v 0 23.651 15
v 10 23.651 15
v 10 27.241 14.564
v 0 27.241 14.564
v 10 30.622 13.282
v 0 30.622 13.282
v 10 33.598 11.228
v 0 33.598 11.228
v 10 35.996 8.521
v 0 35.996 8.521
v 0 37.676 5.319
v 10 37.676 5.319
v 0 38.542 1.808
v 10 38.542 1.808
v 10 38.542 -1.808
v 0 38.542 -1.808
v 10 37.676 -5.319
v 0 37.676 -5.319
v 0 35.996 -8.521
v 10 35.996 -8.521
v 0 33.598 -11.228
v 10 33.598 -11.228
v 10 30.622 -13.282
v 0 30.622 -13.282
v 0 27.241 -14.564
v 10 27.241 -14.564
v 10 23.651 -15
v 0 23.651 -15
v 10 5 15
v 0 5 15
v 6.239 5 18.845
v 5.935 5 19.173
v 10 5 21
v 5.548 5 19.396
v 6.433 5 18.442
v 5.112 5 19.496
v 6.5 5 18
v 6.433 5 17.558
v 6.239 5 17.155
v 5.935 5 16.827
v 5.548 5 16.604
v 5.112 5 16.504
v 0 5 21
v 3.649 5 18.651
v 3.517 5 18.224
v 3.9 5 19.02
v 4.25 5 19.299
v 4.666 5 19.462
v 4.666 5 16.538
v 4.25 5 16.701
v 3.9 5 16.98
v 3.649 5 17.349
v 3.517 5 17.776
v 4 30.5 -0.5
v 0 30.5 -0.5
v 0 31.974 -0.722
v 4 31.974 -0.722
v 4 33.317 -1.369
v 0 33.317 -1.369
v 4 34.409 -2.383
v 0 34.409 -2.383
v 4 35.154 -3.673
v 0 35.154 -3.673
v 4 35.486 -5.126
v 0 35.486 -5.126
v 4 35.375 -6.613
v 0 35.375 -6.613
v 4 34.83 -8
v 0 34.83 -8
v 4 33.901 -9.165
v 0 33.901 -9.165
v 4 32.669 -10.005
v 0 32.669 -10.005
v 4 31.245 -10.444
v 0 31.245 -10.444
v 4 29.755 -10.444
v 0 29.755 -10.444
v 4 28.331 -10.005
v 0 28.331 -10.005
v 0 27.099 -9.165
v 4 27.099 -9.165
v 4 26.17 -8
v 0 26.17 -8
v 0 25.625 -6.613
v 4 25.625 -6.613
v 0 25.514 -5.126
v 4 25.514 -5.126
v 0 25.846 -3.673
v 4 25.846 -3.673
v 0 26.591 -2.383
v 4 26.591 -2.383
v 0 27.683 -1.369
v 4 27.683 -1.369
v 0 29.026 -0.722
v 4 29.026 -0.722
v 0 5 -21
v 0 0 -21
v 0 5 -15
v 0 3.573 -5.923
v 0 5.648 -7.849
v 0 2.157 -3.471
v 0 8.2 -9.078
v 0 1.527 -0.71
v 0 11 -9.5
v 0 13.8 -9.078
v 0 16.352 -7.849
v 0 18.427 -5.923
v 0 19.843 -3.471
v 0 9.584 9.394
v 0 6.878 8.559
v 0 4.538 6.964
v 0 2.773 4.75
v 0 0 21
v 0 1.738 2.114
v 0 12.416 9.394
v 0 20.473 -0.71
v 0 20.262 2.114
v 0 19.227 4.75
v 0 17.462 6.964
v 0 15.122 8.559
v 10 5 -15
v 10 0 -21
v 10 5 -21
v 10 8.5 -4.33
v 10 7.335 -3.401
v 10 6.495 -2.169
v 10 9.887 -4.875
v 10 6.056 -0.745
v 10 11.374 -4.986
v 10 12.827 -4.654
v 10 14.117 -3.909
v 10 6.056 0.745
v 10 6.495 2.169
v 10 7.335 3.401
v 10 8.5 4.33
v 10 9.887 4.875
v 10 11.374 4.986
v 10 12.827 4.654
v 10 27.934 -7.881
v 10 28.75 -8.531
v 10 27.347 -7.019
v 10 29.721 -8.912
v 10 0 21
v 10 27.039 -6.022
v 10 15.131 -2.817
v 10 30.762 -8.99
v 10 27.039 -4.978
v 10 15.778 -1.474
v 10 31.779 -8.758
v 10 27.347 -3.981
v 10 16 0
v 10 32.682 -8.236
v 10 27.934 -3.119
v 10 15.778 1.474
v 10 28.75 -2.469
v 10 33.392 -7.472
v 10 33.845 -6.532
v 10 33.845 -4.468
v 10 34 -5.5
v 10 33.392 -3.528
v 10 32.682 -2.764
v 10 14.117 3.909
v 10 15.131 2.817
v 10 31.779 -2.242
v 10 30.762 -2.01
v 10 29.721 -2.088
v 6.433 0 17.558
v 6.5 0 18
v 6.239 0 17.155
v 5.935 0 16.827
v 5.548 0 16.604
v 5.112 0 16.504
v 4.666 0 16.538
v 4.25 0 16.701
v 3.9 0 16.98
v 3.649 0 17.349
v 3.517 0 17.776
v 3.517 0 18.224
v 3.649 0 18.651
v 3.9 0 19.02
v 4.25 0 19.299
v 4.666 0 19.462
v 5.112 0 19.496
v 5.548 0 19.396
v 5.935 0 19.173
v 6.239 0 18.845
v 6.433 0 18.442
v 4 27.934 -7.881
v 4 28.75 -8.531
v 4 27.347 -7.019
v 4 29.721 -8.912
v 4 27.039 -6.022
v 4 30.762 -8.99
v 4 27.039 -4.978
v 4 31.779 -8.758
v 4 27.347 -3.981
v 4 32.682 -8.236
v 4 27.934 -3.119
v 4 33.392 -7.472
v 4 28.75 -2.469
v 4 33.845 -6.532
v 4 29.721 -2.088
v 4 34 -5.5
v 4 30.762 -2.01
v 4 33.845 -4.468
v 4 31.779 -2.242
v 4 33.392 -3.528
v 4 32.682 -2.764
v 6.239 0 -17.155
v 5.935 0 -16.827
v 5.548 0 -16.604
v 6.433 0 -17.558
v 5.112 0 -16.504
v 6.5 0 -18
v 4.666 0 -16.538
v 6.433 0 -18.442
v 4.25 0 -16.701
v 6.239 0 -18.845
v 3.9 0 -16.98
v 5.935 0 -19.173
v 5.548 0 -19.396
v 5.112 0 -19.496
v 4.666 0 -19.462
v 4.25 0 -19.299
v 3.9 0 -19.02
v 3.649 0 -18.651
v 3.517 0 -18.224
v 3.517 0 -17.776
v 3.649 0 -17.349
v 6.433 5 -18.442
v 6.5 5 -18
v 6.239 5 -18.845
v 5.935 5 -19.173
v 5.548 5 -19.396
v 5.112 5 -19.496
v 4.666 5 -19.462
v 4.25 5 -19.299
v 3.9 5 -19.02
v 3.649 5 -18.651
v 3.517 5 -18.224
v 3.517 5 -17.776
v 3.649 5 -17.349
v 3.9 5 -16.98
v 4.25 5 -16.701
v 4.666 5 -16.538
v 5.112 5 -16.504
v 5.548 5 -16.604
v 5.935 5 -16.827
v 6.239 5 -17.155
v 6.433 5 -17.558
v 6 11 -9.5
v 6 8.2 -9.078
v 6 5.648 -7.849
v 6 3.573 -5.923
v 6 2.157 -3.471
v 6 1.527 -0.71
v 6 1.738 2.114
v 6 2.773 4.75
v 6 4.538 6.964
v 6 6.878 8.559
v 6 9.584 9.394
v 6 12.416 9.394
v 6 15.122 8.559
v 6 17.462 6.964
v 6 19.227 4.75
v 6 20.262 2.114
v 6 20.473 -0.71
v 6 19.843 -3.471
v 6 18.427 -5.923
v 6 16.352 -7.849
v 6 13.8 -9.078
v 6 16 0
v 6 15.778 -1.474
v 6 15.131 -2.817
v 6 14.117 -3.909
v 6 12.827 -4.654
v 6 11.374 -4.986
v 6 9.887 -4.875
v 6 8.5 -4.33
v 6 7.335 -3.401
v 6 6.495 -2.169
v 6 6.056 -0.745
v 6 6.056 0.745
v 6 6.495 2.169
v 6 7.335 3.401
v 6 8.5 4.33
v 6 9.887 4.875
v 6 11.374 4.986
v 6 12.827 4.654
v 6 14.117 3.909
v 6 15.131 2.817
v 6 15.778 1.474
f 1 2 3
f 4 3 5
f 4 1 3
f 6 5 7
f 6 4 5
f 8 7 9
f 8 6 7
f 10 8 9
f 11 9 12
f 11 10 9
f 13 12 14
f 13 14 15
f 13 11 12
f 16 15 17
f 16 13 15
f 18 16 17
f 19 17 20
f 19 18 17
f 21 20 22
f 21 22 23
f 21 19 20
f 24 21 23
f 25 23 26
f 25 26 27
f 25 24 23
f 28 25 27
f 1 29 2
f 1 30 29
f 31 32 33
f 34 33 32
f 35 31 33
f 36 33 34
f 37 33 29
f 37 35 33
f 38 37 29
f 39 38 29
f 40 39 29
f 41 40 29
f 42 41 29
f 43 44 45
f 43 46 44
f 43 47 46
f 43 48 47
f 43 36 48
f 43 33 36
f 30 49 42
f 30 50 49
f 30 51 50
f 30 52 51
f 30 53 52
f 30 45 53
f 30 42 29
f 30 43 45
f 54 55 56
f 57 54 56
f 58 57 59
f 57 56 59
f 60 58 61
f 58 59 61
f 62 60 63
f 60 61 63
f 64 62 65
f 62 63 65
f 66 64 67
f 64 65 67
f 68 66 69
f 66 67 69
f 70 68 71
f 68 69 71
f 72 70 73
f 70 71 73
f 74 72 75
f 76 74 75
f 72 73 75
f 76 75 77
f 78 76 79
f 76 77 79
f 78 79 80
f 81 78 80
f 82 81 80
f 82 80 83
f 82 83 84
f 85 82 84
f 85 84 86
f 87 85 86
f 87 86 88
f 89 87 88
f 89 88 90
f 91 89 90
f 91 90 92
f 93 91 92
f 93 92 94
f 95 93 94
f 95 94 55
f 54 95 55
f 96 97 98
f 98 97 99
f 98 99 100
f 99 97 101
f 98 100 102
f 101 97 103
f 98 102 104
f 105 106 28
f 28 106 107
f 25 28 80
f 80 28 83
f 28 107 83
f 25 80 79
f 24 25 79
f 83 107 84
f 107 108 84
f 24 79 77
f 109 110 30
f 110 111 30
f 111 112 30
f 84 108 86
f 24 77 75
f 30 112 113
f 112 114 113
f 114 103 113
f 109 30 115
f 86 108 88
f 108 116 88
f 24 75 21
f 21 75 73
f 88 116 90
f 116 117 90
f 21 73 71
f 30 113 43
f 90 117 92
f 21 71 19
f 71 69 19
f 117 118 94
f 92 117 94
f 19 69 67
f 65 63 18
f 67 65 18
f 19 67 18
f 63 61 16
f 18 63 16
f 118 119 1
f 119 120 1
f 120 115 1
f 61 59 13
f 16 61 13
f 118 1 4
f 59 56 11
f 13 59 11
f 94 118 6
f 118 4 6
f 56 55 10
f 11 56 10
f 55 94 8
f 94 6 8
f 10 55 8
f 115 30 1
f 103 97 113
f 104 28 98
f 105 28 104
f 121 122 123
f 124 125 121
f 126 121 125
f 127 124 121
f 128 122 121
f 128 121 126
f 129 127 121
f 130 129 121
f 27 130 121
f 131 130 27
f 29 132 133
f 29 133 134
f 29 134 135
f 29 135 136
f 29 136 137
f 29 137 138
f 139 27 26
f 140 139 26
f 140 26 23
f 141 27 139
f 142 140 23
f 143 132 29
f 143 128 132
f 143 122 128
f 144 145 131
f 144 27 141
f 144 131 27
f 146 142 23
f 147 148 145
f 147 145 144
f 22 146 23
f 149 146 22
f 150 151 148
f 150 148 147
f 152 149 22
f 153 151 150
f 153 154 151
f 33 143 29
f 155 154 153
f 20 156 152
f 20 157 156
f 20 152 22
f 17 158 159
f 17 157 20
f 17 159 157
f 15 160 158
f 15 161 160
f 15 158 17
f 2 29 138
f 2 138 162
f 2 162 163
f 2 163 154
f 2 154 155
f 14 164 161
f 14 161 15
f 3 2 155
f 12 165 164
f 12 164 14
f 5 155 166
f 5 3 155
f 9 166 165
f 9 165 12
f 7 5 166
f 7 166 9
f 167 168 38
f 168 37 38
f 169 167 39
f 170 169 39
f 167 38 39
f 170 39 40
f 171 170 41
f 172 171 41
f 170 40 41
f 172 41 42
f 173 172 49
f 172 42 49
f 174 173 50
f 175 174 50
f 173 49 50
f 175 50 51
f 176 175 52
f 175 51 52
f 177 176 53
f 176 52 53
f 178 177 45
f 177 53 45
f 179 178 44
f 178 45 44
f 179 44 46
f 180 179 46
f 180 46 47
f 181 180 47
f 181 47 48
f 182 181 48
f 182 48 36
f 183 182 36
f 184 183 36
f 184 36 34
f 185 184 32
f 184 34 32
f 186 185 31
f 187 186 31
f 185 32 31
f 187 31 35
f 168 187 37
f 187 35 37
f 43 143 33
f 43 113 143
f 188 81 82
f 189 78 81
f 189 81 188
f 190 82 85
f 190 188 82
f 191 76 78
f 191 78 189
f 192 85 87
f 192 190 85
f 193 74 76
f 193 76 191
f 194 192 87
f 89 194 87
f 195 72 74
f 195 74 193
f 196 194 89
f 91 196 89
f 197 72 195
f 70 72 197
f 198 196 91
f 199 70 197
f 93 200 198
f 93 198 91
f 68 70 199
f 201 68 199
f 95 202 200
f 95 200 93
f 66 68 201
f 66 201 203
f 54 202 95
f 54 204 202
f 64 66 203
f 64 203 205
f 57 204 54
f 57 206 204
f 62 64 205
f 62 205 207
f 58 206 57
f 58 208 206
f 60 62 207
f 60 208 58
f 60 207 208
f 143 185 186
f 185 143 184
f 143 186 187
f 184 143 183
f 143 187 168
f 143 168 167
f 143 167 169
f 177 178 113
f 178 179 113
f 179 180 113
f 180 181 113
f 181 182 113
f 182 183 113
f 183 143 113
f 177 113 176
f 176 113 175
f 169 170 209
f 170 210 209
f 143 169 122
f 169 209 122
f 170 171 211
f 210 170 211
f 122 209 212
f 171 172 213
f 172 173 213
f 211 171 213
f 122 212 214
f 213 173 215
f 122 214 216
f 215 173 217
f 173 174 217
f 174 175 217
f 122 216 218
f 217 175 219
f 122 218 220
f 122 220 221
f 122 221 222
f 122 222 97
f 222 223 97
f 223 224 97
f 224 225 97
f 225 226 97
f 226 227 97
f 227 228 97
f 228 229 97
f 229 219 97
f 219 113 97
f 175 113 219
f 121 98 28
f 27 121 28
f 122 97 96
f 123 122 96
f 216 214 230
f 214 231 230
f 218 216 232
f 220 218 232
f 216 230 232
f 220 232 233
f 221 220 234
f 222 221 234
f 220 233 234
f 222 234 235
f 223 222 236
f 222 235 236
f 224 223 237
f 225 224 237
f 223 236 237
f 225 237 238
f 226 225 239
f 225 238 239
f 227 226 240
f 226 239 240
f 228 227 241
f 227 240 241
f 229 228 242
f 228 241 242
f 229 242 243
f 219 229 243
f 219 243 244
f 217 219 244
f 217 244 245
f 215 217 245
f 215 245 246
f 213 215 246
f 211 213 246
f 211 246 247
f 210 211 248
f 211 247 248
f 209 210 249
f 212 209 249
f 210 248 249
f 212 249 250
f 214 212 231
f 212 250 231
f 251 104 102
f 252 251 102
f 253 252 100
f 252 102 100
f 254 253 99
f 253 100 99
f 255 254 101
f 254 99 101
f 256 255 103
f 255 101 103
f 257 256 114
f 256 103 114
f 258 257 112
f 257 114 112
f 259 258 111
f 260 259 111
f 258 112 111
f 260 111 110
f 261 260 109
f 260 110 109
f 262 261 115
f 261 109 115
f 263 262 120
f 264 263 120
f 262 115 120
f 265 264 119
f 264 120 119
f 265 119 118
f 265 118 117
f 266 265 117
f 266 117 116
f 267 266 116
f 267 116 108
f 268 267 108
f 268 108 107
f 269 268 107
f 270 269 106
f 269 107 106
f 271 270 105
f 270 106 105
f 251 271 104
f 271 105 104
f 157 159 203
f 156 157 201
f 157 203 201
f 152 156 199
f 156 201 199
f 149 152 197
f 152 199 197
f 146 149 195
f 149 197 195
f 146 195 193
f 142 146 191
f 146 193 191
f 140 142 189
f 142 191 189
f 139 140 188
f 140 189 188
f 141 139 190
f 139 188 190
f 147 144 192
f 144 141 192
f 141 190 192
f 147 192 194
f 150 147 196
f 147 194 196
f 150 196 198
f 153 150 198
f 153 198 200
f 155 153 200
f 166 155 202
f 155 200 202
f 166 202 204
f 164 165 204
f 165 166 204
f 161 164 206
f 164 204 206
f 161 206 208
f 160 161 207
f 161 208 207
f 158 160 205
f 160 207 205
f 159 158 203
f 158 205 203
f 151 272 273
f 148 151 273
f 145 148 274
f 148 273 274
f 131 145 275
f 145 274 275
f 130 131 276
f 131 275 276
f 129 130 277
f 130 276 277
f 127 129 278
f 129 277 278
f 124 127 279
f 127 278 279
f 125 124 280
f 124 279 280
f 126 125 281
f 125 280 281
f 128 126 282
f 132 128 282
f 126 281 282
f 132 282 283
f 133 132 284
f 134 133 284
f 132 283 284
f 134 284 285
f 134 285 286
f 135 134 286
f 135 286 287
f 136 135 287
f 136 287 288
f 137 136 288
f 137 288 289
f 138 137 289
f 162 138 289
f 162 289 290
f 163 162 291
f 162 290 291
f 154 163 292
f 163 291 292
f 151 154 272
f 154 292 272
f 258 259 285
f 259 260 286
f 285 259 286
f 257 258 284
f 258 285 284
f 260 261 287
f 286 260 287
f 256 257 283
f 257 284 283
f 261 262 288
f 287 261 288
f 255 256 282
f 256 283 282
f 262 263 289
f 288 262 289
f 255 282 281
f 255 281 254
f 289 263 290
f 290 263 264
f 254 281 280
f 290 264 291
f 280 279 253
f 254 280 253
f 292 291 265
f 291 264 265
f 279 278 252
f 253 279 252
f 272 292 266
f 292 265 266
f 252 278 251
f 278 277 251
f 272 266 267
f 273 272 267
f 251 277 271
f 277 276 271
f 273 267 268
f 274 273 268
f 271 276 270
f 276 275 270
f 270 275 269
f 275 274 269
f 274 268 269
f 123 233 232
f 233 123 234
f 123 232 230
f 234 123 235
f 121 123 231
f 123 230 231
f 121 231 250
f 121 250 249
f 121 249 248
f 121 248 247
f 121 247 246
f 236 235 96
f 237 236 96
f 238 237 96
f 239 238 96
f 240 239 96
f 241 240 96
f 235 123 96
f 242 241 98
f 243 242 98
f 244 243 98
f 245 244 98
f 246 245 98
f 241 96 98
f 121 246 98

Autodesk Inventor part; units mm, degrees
sketch "Sketch1" plane through (0, 0, 0) normal (1, 0, 0) x (0, 1, 0)
  circle A0 centre (30.5, -5.5) radius 3.5
  line L0 (11, 15) -> (5, 15)
  line L1 (5, -15) -> (11, -15)
  line L2 (0, -21) -> (5, -21)
  line L3 (5, -21) -> (5, -15)
  line L4 (0, 21) -> (5, 21)
  line L5 (5, 21) -> (5, 15)
  line L6 (-7.7302, 0) -> (46.3815, 0) projected
  line L7 (0, 29.4) -> (0, -29.4) projected
  line L8 (0, 21) -> (0, -21)
  line L9 (11, -15) -> (23.6512, -15)
  line L10 (11, 15) -> (23.6512, 15)
  arc A1 (23.6512, -15) -> (23.6512, 15) centre (23.6512, 0) ccw
  circle A2 centre (11, 0) radius 5
  point P0 (2.5, -21)
  dimension "d7" = 7
  dimension "d45" = 21
  dimension "d64" = 5
  dimension "d65" = 21
  dimension "d66" = 5
  dimension "d67" = 15
  dimension "d69" = 5.5
  dimension "d73" = 0
  dimension "d74" = 30.5
  dimension "d75" = 10
  dimension "d76" = 0
  dimension "d77" = 11
  dimension "d78" = 15
  dimension "d79" = 15
  dimension "d80" = 23.6512
extrude "Extrusion1" add sketch "Sketch1" along normal blind 10 contours L10 A1 L6 A2 L7 L4 L5 L0 | A1 L9 L1 L3 L2 L7 L6 A2
sketch "Sketch4" plane through (10, 0, 0) normal (1, 0, 0) x (0, 0, -1)
  circle A0 centre (0, 11) radius 9.5
  line L0 (-29.4, 0) -> (29.4, 0) projected
  line L1 (0, -7.7302) -> (0, 46.3815) projected
  point P0 (0, 0)
  dimension "d56" = 19
  dimension "d58" = 11
  dimension "d59" = 0
extrude "Extrusion2" cut sketch "Sketch4" along normal blind 6 from surface at -10
sketch "Sketch6" plane through (0, 5, -15) normal (0, 1, 0) x (1, 0, 0)
  circle A0 centre (5, 3) radius 1.5
  line L0 (12, -15) -> (-2, -15) projected
  circle A1 centre (5, -33) radius 1.5
  line L1 (0, -30) -> (0, -36) projected
  line L2 (0, 6) -> (0, 0) projected
  point P0 (0, -15)
  point P1 (0, -33)
  point P2 (0, 3)
  dimension "d81" = 3
  dimension "d82" = 18
  dimension "d83" = 3
  dimension "d84" = 18
  dimension "d85" = 5
  dimension "d86" = 5
extrude "Extrusion3" cut sketch "Sketch6" against normal blind 5
sketch "Sketch7" plane through (0, 0, 0) normal (-1, 0, 0) x (0, 0, 1)
  circle A0 centre (-5.5, 30.5) radius 5
  line L0 (21, 0) -> (-21, 0) projected
  line L1 (0, -7.7302) -> (0, 46.3815) projected
  point P0 (0, 0)
  dimension "d89" = 10
  dimension "d90" = 30.5
  dimension "d91" = 5.5
extrude "Extrusion4" cut sketch "Sketch7" against normal blind 4
properties part number "support_arriere_droite"
